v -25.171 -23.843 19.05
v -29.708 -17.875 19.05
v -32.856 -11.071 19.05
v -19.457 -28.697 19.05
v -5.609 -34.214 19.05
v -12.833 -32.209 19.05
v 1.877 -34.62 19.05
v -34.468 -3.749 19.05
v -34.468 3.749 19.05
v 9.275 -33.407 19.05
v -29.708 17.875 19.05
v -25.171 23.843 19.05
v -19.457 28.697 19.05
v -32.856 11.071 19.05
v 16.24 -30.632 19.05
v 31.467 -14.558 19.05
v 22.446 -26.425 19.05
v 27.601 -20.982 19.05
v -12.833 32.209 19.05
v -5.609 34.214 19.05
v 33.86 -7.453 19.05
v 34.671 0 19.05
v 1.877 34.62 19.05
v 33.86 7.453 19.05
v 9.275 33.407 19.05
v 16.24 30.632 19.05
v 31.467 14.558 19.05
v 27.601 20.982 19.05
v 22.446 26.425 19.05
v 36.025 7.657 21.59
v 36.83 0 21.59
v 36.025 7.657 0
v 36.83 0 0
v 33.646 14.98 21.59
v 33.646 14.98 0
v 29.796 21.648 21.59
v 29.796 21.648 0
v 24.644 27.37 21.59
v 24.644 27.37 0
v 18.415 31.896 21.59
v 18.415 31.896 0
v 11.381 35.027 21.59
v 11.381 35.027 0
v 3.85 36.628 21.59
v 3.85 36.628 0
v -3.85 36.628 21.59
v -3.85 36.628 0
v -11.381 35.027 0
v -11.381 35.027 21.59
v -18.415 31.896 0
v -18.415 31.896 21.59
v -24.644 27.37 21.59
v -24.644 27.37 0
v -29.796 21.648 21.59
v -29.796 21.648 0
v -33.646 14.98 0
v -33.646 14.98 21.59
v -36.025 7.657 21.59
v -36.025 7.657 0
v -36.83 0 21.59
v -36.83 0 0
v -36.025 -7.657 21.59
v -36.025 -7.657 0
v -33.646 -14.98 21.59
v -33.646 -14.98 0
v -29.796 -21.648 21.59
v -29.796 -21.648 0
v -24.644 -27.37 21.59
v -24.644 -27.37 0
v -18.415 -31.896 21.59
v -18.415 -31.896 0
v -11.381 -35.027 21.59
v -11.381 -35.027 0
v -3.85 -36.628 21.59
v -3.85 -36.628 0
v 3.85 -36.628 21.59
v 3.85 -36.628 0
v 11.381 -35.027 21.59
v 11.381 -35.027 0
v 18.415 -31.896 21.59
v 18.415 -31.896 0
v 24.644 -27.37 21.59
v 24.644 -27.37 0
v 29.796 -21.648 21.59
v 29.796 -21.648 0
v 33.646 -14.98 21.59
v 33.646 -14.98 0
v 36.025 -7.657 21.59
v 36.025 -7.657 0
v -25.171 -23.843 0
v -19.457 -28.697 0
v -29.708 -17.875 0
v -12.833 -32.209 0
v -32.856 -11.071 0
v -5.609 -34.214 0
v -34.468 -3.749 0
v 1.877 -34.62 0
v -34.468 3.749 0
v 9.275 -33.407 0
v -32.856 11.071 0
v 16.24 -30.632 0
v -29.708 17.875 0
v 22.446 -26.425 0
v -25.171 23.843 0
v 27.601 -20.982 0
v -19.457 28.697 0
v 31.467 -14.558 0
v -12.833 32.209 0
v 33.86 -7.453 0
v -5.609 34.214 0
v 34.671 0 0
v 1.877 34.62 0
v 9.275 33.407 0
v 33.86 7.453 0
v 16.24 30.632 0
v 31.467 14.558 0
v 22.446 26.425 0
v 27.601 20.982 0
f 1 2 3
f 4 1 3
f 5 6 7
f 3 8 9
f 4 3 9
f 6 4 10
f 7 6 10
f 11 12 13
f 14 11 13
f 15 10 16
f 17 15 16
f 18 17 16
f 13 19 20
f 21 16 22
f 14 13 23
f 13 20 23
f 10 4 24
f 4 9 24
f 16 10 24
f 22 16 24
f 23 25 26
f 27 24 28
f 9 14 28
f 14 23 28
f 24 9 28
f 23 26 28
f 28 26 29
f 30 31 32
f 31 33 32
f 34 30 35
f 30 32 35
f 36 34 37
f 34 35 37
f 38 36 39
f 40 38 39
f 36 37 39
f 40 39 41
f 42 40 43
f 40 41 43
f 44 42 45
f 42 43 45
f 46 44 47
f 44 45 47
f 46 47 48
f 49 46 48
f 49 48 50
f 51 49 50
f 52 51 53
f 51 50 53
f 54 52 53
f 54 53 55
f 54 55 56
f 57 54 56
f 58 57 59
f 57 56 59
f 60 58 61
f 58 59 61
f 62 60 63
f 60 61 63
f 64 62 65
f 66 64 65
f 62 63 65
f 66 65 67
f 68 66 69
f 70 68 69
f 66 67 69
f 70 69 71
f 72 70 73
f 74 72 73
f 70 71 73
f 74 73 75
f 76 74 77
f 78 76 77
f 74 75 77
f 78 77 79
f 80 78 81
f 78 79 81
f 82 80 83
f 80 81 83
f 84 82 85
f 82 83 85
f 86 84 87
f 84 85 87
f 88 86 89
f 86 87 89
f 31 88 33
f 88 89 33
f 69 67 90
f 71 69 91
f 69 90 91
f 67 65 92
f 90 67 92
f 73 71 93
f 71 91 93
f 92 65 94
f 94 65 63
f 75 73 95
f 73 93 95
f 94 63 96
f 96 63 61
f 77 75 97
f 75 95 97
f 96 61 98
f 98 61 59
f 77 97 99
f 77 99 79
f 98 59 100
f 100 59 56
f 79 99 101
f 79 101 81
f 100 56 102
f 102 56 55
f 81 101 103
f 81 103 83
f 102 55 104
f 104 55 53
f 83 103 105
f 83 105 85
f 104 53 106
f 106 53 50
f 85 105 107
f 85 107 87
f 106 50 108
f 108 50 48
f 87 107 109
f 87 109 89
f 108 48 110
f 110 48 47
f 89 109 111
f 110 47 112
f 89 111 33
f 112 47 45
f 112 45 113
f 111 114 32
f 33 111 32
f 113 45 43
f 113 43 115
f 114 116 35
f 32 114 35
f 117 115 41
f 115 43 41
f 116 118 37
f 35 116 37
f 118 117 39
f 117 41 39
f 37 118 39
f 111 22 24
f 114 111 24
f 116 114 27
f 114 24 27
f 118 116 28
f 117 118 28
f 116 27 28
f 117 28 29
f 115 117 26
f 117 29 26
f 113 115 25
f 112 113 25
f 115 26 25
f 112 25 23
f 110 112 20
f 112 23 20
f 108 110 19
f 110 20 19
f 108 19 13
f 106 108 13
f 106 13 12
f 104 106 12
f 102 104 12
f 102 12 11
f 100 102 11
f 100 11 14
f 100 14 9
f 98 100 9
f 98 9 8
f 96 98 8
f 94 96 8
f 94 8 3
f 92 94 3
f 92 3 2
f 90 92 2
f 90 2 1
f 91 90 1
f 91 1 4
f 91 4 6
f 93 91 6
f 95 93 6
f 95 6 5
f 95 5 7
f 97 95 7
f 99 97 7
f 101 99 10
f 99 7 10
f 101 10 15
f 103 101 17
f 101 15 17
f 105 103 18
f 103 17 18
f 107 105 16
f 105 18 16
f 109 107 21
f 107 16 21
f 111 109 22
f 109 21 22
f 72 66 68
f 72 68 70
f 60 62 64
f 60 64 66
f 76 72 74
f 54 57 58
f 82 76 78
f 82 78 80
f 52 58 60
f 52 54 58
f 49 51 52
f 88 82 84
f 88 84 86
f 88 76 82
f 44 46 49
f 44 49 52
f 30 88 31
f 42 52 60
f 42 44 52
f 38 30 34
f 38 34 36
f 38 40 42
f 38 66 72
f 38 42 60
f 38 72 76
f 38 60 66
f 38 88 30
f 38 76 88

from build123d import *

# Parameters (mm, degrees)
F0_R     = 36.83
F1_DEPTH = 19.05
F2_R     = 34.671
F3_DEPTH = 97.79
F4_R     = 36.83
F5_DEPTH = 2.54


with BuildPart() as f1:
    # F0 (on Top) → F1 (new body)
    with BuildSketch(Plane.XY):
        Circle(F0_R)
    extrude(amount=F1_DEPTH)

    # F2 (on face) → F3 (cut)
    with BuildSketch(Plane.XY.offset(19.05)):
        Circle(F2_R)
    extrude(amount=-F3_DEPTH, mode=Mode.SUBTRACT)

    # F4 (on face) → F5 (join)
    with BuildSketch(Plane.XY.offset(19.05)):
        Circle(F4_R)
    extrude(amount=F5_DEPTH)


solid = f1.part
